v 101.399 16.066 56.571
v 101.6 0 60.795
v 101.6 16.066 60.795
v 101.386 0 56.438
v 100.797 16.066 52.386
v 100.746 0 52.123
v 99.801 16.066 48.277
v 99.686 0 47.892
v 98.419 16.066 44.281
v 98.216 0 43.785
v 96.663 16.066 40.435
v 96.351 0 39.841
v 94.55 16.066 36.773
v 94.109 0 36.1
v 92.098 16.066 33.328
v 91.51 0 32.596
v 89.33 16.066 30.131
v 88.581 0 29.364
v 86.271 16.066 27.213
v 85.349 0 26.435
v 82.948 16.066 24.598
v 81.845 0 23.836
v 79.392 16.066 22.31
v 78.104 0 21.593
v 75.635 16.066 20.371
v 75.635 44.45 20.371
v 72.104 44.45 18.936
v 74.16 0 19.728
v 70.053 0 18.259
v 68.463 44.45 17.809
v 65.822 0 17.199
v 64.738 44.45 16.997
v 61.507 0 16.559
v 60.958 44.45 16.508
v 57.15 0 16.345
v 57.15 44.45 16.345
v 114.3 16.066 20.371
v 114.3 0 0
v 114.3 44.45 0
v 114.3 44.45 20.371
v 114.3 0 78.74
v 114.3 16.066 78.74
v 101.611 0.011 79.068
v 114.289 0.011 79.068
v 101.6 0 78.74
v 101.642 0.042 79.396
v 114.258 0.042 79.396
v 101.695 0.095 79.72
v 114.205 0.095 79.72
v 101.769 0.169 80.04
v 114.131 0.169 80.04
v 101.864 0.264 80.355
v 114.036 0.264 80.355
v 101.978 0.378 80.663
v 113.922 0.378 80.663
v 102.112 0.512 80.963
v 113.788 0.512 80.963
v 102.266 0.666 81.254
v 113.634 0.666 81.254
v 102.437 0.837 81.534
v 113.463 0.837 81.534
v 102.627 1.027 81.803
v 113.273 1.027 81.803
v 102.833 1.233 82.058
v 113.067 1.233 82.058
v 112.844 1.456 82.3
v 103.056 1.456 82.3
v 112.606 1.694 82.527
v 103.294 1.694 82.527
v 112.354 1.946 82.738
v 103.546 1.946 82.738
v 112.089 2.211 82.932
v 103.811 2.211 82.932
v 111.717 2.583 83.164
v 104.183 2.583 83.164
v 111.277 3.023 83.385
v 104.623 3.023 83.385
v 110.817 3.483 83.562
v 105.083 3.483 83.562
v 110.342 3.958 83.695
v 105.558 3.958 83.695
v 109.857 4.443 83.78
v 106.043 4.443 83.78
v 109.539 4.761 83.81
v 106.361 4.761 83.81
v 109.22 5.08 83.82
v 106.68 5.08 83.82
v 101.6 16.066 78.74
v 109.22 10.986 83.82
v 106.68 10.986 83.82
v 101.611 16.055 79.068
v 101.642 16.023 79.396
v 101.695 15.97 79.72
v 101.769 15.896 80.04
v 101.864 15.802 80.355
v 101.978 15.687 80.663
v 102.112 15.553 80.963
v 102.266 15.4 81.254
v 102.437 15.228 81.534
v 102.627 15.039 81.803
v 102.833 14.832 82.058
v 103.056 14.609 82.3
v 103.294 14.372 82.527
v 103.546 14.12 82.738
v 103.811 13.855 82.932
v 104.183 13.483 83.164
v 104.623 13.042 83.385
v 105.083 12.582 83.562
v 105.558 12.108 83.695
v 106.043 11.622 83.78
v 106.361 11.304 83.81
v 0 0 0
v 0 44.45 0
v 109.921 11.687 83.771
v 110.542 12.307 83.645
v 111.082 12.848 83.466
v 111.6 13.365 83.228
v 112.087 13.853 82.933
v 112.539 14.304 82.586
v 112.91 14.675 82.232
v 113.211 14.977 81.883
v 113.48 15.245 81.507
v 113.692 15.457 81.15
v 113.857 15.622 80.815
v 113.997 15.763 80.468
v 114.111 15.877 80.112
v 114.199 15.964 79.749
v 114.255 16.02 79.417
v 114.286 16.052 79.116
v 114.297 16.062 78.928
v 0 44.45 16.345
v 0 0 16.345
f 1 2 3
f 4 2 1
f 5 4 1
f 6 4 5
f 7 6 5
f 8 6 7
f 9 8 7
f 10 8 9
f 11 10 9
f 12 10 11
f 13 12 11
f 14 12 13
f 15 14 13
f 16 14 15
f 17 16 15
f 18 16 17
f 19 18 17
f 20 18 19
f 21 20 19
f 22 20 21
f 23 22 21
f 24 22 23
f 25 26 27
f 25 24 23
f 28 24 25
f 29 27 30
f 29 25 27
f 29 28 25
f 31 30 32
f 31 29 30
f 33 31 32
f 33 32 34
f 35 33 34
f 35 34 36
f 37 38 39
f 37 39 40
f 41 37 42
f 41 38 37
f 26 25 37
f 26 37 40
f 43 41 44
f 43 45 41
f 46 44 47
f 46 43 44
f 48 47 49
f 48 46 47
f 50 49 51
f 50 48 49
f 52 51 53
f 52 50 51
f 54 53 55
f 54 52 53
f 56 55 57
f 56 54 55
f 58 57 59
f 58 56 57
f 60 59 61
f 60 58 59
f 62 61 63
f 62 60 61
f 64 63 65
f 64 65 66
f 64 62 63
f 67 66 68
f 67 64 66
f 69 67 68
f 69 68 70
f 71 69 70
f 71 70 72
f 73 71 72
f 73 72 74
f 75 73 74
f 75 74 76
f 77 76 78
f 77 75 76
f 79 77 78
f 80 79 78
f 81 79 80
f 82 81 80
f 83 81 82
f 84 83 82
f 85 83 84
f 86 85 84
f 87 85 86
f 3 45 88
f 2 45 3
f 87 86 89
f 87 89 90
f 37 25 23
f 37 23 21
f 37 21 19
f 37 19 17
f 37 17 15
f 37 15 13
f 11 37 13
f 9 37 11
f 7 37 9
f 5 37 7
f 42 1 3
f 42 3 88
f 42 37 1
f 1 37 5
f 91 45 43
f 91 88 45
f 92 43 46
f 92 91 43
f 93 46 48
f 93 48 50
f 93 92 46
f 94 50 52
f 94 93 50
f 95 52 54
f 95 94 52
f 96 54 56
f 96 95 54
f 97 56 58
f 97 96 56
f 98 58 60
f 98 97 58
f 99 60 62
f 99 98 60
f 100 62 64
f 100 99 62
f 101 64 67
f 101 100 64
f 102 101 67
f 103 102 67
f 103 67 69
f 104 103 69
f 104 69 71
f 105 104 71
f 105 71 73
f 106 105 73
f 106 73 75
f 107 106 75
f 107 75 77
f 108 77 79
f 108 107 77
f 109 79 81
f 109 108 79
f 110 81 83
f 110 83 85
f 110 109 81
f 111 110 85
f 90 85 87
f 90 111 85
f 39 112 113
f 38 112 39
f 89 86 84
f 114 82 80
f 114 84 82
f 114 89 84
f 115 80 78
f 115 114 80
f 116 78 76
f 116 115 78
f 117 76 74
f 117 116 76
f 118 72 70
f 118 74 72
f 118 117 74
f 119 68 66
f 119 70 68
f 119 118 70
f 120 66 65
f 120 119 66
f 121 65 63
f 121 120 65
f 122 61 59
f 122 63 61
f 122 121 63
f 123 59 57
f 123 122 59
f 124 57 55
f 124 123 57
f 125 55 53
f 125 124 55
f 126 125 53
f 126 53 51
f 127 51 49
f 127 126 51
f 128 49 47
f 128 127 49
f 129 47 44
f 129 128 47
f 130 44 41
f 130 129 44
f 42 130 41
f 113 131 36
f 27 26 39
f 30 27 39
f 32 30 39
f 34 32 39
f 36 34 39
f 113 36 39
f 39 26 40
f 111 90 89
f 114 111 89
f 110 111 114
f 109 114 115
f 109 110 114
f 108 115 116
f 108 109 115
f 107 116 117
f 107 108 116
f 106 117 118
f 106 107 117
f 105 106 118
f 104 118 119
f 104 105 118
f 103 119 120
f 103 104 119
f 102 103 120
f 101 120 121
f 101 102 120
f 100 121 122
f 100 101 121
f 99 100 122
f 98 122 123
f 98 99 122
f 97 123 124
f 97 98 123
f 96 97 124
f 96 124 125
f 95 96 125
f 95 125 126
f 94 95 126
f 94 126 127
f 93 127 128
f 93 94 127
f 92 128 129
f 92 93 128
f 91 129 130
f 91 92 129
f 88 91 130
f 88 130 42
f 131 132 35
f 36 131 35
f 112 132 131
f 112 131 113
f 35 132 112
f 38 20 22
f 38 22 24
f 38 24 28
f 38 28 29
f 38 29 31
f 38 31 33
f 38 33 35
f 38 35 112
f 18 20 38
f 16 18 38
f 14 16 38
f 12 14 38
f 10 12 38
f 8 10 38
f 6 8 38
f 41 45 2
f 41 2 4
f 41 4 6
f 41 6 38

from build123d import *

# Parameters (mm, degrees)
F1_DEPTH = 44.45
F2_W     = 28.3845
F2_H     = 63.4492
F3_DEPTH = 114.3
F5_DEPTH = 127
F6_R     = 5.08


with BuildPart() as f1:
    # F0 (on Front) → F1 (new body)
    with BuildSketch(Plane.XZ):
        with BuildLine():
            Line((0, 83.82), (0, 0))
            Line((0, 0), (114.3, 0))
            Line((114.3, 0), (114.3, 83.82))
            Line((114.3, 83.82), (101.6, 83.82))
            Line((101.6, 83.82), (101.6, 60.7949))
            ThreePointArc((101.6, 60.7949), (57.15, 16.3449), (12.7, 60.7949))
            Line((12.7, 60.7949), (12.7, 83.82))
            Line((12.7, 83.82), (0, 83.82))
        make_face()
    extrude(amount=-F1_DEPTH)

    # F2 (on face) → F3 (cut)
    with BuildSketch(Plane.YZ.offset(114.3)):
        with Locations((30.25775, 52.0954)):
            Rectangle(F2_W, F2_H)
    extrude(amount=-F3_DEPTH, mode=Mode.SUBTRACT)

    # F4 (on face) → F5 (cut)
    with BuildSketch(Plane.XZ):
        with BuildLine():
            Line((0, 16.3449), (57.15, 16.3449))
            ThreePointArc((57.15, 16.3449), (25.7191035763, 29.3640035763), (12.7, 60.7949))
            Line((12.7, 60.7949), (12.7, 83.82))
            Line((12.7, 83.82), (0, 83.82))
            Line((0, 83.82), (0, 16.3449))
        make_face()
    extrude(amount=-F5_DEPTH, mode=Mode.SUBTRACT)

    # F6
    f6_edges = [f1.edges().sort_by_distance(p)[0] for p in [
        (107.95, 0, 83.82),
        (101.6, 8.03275, 83.82),
        (107.95, 16.0655, 83.82),
        (114.3, 8.03275, 83.82),
    ]]
    fillet(f6_edges, radius=F6_R)


solid = f1.part
